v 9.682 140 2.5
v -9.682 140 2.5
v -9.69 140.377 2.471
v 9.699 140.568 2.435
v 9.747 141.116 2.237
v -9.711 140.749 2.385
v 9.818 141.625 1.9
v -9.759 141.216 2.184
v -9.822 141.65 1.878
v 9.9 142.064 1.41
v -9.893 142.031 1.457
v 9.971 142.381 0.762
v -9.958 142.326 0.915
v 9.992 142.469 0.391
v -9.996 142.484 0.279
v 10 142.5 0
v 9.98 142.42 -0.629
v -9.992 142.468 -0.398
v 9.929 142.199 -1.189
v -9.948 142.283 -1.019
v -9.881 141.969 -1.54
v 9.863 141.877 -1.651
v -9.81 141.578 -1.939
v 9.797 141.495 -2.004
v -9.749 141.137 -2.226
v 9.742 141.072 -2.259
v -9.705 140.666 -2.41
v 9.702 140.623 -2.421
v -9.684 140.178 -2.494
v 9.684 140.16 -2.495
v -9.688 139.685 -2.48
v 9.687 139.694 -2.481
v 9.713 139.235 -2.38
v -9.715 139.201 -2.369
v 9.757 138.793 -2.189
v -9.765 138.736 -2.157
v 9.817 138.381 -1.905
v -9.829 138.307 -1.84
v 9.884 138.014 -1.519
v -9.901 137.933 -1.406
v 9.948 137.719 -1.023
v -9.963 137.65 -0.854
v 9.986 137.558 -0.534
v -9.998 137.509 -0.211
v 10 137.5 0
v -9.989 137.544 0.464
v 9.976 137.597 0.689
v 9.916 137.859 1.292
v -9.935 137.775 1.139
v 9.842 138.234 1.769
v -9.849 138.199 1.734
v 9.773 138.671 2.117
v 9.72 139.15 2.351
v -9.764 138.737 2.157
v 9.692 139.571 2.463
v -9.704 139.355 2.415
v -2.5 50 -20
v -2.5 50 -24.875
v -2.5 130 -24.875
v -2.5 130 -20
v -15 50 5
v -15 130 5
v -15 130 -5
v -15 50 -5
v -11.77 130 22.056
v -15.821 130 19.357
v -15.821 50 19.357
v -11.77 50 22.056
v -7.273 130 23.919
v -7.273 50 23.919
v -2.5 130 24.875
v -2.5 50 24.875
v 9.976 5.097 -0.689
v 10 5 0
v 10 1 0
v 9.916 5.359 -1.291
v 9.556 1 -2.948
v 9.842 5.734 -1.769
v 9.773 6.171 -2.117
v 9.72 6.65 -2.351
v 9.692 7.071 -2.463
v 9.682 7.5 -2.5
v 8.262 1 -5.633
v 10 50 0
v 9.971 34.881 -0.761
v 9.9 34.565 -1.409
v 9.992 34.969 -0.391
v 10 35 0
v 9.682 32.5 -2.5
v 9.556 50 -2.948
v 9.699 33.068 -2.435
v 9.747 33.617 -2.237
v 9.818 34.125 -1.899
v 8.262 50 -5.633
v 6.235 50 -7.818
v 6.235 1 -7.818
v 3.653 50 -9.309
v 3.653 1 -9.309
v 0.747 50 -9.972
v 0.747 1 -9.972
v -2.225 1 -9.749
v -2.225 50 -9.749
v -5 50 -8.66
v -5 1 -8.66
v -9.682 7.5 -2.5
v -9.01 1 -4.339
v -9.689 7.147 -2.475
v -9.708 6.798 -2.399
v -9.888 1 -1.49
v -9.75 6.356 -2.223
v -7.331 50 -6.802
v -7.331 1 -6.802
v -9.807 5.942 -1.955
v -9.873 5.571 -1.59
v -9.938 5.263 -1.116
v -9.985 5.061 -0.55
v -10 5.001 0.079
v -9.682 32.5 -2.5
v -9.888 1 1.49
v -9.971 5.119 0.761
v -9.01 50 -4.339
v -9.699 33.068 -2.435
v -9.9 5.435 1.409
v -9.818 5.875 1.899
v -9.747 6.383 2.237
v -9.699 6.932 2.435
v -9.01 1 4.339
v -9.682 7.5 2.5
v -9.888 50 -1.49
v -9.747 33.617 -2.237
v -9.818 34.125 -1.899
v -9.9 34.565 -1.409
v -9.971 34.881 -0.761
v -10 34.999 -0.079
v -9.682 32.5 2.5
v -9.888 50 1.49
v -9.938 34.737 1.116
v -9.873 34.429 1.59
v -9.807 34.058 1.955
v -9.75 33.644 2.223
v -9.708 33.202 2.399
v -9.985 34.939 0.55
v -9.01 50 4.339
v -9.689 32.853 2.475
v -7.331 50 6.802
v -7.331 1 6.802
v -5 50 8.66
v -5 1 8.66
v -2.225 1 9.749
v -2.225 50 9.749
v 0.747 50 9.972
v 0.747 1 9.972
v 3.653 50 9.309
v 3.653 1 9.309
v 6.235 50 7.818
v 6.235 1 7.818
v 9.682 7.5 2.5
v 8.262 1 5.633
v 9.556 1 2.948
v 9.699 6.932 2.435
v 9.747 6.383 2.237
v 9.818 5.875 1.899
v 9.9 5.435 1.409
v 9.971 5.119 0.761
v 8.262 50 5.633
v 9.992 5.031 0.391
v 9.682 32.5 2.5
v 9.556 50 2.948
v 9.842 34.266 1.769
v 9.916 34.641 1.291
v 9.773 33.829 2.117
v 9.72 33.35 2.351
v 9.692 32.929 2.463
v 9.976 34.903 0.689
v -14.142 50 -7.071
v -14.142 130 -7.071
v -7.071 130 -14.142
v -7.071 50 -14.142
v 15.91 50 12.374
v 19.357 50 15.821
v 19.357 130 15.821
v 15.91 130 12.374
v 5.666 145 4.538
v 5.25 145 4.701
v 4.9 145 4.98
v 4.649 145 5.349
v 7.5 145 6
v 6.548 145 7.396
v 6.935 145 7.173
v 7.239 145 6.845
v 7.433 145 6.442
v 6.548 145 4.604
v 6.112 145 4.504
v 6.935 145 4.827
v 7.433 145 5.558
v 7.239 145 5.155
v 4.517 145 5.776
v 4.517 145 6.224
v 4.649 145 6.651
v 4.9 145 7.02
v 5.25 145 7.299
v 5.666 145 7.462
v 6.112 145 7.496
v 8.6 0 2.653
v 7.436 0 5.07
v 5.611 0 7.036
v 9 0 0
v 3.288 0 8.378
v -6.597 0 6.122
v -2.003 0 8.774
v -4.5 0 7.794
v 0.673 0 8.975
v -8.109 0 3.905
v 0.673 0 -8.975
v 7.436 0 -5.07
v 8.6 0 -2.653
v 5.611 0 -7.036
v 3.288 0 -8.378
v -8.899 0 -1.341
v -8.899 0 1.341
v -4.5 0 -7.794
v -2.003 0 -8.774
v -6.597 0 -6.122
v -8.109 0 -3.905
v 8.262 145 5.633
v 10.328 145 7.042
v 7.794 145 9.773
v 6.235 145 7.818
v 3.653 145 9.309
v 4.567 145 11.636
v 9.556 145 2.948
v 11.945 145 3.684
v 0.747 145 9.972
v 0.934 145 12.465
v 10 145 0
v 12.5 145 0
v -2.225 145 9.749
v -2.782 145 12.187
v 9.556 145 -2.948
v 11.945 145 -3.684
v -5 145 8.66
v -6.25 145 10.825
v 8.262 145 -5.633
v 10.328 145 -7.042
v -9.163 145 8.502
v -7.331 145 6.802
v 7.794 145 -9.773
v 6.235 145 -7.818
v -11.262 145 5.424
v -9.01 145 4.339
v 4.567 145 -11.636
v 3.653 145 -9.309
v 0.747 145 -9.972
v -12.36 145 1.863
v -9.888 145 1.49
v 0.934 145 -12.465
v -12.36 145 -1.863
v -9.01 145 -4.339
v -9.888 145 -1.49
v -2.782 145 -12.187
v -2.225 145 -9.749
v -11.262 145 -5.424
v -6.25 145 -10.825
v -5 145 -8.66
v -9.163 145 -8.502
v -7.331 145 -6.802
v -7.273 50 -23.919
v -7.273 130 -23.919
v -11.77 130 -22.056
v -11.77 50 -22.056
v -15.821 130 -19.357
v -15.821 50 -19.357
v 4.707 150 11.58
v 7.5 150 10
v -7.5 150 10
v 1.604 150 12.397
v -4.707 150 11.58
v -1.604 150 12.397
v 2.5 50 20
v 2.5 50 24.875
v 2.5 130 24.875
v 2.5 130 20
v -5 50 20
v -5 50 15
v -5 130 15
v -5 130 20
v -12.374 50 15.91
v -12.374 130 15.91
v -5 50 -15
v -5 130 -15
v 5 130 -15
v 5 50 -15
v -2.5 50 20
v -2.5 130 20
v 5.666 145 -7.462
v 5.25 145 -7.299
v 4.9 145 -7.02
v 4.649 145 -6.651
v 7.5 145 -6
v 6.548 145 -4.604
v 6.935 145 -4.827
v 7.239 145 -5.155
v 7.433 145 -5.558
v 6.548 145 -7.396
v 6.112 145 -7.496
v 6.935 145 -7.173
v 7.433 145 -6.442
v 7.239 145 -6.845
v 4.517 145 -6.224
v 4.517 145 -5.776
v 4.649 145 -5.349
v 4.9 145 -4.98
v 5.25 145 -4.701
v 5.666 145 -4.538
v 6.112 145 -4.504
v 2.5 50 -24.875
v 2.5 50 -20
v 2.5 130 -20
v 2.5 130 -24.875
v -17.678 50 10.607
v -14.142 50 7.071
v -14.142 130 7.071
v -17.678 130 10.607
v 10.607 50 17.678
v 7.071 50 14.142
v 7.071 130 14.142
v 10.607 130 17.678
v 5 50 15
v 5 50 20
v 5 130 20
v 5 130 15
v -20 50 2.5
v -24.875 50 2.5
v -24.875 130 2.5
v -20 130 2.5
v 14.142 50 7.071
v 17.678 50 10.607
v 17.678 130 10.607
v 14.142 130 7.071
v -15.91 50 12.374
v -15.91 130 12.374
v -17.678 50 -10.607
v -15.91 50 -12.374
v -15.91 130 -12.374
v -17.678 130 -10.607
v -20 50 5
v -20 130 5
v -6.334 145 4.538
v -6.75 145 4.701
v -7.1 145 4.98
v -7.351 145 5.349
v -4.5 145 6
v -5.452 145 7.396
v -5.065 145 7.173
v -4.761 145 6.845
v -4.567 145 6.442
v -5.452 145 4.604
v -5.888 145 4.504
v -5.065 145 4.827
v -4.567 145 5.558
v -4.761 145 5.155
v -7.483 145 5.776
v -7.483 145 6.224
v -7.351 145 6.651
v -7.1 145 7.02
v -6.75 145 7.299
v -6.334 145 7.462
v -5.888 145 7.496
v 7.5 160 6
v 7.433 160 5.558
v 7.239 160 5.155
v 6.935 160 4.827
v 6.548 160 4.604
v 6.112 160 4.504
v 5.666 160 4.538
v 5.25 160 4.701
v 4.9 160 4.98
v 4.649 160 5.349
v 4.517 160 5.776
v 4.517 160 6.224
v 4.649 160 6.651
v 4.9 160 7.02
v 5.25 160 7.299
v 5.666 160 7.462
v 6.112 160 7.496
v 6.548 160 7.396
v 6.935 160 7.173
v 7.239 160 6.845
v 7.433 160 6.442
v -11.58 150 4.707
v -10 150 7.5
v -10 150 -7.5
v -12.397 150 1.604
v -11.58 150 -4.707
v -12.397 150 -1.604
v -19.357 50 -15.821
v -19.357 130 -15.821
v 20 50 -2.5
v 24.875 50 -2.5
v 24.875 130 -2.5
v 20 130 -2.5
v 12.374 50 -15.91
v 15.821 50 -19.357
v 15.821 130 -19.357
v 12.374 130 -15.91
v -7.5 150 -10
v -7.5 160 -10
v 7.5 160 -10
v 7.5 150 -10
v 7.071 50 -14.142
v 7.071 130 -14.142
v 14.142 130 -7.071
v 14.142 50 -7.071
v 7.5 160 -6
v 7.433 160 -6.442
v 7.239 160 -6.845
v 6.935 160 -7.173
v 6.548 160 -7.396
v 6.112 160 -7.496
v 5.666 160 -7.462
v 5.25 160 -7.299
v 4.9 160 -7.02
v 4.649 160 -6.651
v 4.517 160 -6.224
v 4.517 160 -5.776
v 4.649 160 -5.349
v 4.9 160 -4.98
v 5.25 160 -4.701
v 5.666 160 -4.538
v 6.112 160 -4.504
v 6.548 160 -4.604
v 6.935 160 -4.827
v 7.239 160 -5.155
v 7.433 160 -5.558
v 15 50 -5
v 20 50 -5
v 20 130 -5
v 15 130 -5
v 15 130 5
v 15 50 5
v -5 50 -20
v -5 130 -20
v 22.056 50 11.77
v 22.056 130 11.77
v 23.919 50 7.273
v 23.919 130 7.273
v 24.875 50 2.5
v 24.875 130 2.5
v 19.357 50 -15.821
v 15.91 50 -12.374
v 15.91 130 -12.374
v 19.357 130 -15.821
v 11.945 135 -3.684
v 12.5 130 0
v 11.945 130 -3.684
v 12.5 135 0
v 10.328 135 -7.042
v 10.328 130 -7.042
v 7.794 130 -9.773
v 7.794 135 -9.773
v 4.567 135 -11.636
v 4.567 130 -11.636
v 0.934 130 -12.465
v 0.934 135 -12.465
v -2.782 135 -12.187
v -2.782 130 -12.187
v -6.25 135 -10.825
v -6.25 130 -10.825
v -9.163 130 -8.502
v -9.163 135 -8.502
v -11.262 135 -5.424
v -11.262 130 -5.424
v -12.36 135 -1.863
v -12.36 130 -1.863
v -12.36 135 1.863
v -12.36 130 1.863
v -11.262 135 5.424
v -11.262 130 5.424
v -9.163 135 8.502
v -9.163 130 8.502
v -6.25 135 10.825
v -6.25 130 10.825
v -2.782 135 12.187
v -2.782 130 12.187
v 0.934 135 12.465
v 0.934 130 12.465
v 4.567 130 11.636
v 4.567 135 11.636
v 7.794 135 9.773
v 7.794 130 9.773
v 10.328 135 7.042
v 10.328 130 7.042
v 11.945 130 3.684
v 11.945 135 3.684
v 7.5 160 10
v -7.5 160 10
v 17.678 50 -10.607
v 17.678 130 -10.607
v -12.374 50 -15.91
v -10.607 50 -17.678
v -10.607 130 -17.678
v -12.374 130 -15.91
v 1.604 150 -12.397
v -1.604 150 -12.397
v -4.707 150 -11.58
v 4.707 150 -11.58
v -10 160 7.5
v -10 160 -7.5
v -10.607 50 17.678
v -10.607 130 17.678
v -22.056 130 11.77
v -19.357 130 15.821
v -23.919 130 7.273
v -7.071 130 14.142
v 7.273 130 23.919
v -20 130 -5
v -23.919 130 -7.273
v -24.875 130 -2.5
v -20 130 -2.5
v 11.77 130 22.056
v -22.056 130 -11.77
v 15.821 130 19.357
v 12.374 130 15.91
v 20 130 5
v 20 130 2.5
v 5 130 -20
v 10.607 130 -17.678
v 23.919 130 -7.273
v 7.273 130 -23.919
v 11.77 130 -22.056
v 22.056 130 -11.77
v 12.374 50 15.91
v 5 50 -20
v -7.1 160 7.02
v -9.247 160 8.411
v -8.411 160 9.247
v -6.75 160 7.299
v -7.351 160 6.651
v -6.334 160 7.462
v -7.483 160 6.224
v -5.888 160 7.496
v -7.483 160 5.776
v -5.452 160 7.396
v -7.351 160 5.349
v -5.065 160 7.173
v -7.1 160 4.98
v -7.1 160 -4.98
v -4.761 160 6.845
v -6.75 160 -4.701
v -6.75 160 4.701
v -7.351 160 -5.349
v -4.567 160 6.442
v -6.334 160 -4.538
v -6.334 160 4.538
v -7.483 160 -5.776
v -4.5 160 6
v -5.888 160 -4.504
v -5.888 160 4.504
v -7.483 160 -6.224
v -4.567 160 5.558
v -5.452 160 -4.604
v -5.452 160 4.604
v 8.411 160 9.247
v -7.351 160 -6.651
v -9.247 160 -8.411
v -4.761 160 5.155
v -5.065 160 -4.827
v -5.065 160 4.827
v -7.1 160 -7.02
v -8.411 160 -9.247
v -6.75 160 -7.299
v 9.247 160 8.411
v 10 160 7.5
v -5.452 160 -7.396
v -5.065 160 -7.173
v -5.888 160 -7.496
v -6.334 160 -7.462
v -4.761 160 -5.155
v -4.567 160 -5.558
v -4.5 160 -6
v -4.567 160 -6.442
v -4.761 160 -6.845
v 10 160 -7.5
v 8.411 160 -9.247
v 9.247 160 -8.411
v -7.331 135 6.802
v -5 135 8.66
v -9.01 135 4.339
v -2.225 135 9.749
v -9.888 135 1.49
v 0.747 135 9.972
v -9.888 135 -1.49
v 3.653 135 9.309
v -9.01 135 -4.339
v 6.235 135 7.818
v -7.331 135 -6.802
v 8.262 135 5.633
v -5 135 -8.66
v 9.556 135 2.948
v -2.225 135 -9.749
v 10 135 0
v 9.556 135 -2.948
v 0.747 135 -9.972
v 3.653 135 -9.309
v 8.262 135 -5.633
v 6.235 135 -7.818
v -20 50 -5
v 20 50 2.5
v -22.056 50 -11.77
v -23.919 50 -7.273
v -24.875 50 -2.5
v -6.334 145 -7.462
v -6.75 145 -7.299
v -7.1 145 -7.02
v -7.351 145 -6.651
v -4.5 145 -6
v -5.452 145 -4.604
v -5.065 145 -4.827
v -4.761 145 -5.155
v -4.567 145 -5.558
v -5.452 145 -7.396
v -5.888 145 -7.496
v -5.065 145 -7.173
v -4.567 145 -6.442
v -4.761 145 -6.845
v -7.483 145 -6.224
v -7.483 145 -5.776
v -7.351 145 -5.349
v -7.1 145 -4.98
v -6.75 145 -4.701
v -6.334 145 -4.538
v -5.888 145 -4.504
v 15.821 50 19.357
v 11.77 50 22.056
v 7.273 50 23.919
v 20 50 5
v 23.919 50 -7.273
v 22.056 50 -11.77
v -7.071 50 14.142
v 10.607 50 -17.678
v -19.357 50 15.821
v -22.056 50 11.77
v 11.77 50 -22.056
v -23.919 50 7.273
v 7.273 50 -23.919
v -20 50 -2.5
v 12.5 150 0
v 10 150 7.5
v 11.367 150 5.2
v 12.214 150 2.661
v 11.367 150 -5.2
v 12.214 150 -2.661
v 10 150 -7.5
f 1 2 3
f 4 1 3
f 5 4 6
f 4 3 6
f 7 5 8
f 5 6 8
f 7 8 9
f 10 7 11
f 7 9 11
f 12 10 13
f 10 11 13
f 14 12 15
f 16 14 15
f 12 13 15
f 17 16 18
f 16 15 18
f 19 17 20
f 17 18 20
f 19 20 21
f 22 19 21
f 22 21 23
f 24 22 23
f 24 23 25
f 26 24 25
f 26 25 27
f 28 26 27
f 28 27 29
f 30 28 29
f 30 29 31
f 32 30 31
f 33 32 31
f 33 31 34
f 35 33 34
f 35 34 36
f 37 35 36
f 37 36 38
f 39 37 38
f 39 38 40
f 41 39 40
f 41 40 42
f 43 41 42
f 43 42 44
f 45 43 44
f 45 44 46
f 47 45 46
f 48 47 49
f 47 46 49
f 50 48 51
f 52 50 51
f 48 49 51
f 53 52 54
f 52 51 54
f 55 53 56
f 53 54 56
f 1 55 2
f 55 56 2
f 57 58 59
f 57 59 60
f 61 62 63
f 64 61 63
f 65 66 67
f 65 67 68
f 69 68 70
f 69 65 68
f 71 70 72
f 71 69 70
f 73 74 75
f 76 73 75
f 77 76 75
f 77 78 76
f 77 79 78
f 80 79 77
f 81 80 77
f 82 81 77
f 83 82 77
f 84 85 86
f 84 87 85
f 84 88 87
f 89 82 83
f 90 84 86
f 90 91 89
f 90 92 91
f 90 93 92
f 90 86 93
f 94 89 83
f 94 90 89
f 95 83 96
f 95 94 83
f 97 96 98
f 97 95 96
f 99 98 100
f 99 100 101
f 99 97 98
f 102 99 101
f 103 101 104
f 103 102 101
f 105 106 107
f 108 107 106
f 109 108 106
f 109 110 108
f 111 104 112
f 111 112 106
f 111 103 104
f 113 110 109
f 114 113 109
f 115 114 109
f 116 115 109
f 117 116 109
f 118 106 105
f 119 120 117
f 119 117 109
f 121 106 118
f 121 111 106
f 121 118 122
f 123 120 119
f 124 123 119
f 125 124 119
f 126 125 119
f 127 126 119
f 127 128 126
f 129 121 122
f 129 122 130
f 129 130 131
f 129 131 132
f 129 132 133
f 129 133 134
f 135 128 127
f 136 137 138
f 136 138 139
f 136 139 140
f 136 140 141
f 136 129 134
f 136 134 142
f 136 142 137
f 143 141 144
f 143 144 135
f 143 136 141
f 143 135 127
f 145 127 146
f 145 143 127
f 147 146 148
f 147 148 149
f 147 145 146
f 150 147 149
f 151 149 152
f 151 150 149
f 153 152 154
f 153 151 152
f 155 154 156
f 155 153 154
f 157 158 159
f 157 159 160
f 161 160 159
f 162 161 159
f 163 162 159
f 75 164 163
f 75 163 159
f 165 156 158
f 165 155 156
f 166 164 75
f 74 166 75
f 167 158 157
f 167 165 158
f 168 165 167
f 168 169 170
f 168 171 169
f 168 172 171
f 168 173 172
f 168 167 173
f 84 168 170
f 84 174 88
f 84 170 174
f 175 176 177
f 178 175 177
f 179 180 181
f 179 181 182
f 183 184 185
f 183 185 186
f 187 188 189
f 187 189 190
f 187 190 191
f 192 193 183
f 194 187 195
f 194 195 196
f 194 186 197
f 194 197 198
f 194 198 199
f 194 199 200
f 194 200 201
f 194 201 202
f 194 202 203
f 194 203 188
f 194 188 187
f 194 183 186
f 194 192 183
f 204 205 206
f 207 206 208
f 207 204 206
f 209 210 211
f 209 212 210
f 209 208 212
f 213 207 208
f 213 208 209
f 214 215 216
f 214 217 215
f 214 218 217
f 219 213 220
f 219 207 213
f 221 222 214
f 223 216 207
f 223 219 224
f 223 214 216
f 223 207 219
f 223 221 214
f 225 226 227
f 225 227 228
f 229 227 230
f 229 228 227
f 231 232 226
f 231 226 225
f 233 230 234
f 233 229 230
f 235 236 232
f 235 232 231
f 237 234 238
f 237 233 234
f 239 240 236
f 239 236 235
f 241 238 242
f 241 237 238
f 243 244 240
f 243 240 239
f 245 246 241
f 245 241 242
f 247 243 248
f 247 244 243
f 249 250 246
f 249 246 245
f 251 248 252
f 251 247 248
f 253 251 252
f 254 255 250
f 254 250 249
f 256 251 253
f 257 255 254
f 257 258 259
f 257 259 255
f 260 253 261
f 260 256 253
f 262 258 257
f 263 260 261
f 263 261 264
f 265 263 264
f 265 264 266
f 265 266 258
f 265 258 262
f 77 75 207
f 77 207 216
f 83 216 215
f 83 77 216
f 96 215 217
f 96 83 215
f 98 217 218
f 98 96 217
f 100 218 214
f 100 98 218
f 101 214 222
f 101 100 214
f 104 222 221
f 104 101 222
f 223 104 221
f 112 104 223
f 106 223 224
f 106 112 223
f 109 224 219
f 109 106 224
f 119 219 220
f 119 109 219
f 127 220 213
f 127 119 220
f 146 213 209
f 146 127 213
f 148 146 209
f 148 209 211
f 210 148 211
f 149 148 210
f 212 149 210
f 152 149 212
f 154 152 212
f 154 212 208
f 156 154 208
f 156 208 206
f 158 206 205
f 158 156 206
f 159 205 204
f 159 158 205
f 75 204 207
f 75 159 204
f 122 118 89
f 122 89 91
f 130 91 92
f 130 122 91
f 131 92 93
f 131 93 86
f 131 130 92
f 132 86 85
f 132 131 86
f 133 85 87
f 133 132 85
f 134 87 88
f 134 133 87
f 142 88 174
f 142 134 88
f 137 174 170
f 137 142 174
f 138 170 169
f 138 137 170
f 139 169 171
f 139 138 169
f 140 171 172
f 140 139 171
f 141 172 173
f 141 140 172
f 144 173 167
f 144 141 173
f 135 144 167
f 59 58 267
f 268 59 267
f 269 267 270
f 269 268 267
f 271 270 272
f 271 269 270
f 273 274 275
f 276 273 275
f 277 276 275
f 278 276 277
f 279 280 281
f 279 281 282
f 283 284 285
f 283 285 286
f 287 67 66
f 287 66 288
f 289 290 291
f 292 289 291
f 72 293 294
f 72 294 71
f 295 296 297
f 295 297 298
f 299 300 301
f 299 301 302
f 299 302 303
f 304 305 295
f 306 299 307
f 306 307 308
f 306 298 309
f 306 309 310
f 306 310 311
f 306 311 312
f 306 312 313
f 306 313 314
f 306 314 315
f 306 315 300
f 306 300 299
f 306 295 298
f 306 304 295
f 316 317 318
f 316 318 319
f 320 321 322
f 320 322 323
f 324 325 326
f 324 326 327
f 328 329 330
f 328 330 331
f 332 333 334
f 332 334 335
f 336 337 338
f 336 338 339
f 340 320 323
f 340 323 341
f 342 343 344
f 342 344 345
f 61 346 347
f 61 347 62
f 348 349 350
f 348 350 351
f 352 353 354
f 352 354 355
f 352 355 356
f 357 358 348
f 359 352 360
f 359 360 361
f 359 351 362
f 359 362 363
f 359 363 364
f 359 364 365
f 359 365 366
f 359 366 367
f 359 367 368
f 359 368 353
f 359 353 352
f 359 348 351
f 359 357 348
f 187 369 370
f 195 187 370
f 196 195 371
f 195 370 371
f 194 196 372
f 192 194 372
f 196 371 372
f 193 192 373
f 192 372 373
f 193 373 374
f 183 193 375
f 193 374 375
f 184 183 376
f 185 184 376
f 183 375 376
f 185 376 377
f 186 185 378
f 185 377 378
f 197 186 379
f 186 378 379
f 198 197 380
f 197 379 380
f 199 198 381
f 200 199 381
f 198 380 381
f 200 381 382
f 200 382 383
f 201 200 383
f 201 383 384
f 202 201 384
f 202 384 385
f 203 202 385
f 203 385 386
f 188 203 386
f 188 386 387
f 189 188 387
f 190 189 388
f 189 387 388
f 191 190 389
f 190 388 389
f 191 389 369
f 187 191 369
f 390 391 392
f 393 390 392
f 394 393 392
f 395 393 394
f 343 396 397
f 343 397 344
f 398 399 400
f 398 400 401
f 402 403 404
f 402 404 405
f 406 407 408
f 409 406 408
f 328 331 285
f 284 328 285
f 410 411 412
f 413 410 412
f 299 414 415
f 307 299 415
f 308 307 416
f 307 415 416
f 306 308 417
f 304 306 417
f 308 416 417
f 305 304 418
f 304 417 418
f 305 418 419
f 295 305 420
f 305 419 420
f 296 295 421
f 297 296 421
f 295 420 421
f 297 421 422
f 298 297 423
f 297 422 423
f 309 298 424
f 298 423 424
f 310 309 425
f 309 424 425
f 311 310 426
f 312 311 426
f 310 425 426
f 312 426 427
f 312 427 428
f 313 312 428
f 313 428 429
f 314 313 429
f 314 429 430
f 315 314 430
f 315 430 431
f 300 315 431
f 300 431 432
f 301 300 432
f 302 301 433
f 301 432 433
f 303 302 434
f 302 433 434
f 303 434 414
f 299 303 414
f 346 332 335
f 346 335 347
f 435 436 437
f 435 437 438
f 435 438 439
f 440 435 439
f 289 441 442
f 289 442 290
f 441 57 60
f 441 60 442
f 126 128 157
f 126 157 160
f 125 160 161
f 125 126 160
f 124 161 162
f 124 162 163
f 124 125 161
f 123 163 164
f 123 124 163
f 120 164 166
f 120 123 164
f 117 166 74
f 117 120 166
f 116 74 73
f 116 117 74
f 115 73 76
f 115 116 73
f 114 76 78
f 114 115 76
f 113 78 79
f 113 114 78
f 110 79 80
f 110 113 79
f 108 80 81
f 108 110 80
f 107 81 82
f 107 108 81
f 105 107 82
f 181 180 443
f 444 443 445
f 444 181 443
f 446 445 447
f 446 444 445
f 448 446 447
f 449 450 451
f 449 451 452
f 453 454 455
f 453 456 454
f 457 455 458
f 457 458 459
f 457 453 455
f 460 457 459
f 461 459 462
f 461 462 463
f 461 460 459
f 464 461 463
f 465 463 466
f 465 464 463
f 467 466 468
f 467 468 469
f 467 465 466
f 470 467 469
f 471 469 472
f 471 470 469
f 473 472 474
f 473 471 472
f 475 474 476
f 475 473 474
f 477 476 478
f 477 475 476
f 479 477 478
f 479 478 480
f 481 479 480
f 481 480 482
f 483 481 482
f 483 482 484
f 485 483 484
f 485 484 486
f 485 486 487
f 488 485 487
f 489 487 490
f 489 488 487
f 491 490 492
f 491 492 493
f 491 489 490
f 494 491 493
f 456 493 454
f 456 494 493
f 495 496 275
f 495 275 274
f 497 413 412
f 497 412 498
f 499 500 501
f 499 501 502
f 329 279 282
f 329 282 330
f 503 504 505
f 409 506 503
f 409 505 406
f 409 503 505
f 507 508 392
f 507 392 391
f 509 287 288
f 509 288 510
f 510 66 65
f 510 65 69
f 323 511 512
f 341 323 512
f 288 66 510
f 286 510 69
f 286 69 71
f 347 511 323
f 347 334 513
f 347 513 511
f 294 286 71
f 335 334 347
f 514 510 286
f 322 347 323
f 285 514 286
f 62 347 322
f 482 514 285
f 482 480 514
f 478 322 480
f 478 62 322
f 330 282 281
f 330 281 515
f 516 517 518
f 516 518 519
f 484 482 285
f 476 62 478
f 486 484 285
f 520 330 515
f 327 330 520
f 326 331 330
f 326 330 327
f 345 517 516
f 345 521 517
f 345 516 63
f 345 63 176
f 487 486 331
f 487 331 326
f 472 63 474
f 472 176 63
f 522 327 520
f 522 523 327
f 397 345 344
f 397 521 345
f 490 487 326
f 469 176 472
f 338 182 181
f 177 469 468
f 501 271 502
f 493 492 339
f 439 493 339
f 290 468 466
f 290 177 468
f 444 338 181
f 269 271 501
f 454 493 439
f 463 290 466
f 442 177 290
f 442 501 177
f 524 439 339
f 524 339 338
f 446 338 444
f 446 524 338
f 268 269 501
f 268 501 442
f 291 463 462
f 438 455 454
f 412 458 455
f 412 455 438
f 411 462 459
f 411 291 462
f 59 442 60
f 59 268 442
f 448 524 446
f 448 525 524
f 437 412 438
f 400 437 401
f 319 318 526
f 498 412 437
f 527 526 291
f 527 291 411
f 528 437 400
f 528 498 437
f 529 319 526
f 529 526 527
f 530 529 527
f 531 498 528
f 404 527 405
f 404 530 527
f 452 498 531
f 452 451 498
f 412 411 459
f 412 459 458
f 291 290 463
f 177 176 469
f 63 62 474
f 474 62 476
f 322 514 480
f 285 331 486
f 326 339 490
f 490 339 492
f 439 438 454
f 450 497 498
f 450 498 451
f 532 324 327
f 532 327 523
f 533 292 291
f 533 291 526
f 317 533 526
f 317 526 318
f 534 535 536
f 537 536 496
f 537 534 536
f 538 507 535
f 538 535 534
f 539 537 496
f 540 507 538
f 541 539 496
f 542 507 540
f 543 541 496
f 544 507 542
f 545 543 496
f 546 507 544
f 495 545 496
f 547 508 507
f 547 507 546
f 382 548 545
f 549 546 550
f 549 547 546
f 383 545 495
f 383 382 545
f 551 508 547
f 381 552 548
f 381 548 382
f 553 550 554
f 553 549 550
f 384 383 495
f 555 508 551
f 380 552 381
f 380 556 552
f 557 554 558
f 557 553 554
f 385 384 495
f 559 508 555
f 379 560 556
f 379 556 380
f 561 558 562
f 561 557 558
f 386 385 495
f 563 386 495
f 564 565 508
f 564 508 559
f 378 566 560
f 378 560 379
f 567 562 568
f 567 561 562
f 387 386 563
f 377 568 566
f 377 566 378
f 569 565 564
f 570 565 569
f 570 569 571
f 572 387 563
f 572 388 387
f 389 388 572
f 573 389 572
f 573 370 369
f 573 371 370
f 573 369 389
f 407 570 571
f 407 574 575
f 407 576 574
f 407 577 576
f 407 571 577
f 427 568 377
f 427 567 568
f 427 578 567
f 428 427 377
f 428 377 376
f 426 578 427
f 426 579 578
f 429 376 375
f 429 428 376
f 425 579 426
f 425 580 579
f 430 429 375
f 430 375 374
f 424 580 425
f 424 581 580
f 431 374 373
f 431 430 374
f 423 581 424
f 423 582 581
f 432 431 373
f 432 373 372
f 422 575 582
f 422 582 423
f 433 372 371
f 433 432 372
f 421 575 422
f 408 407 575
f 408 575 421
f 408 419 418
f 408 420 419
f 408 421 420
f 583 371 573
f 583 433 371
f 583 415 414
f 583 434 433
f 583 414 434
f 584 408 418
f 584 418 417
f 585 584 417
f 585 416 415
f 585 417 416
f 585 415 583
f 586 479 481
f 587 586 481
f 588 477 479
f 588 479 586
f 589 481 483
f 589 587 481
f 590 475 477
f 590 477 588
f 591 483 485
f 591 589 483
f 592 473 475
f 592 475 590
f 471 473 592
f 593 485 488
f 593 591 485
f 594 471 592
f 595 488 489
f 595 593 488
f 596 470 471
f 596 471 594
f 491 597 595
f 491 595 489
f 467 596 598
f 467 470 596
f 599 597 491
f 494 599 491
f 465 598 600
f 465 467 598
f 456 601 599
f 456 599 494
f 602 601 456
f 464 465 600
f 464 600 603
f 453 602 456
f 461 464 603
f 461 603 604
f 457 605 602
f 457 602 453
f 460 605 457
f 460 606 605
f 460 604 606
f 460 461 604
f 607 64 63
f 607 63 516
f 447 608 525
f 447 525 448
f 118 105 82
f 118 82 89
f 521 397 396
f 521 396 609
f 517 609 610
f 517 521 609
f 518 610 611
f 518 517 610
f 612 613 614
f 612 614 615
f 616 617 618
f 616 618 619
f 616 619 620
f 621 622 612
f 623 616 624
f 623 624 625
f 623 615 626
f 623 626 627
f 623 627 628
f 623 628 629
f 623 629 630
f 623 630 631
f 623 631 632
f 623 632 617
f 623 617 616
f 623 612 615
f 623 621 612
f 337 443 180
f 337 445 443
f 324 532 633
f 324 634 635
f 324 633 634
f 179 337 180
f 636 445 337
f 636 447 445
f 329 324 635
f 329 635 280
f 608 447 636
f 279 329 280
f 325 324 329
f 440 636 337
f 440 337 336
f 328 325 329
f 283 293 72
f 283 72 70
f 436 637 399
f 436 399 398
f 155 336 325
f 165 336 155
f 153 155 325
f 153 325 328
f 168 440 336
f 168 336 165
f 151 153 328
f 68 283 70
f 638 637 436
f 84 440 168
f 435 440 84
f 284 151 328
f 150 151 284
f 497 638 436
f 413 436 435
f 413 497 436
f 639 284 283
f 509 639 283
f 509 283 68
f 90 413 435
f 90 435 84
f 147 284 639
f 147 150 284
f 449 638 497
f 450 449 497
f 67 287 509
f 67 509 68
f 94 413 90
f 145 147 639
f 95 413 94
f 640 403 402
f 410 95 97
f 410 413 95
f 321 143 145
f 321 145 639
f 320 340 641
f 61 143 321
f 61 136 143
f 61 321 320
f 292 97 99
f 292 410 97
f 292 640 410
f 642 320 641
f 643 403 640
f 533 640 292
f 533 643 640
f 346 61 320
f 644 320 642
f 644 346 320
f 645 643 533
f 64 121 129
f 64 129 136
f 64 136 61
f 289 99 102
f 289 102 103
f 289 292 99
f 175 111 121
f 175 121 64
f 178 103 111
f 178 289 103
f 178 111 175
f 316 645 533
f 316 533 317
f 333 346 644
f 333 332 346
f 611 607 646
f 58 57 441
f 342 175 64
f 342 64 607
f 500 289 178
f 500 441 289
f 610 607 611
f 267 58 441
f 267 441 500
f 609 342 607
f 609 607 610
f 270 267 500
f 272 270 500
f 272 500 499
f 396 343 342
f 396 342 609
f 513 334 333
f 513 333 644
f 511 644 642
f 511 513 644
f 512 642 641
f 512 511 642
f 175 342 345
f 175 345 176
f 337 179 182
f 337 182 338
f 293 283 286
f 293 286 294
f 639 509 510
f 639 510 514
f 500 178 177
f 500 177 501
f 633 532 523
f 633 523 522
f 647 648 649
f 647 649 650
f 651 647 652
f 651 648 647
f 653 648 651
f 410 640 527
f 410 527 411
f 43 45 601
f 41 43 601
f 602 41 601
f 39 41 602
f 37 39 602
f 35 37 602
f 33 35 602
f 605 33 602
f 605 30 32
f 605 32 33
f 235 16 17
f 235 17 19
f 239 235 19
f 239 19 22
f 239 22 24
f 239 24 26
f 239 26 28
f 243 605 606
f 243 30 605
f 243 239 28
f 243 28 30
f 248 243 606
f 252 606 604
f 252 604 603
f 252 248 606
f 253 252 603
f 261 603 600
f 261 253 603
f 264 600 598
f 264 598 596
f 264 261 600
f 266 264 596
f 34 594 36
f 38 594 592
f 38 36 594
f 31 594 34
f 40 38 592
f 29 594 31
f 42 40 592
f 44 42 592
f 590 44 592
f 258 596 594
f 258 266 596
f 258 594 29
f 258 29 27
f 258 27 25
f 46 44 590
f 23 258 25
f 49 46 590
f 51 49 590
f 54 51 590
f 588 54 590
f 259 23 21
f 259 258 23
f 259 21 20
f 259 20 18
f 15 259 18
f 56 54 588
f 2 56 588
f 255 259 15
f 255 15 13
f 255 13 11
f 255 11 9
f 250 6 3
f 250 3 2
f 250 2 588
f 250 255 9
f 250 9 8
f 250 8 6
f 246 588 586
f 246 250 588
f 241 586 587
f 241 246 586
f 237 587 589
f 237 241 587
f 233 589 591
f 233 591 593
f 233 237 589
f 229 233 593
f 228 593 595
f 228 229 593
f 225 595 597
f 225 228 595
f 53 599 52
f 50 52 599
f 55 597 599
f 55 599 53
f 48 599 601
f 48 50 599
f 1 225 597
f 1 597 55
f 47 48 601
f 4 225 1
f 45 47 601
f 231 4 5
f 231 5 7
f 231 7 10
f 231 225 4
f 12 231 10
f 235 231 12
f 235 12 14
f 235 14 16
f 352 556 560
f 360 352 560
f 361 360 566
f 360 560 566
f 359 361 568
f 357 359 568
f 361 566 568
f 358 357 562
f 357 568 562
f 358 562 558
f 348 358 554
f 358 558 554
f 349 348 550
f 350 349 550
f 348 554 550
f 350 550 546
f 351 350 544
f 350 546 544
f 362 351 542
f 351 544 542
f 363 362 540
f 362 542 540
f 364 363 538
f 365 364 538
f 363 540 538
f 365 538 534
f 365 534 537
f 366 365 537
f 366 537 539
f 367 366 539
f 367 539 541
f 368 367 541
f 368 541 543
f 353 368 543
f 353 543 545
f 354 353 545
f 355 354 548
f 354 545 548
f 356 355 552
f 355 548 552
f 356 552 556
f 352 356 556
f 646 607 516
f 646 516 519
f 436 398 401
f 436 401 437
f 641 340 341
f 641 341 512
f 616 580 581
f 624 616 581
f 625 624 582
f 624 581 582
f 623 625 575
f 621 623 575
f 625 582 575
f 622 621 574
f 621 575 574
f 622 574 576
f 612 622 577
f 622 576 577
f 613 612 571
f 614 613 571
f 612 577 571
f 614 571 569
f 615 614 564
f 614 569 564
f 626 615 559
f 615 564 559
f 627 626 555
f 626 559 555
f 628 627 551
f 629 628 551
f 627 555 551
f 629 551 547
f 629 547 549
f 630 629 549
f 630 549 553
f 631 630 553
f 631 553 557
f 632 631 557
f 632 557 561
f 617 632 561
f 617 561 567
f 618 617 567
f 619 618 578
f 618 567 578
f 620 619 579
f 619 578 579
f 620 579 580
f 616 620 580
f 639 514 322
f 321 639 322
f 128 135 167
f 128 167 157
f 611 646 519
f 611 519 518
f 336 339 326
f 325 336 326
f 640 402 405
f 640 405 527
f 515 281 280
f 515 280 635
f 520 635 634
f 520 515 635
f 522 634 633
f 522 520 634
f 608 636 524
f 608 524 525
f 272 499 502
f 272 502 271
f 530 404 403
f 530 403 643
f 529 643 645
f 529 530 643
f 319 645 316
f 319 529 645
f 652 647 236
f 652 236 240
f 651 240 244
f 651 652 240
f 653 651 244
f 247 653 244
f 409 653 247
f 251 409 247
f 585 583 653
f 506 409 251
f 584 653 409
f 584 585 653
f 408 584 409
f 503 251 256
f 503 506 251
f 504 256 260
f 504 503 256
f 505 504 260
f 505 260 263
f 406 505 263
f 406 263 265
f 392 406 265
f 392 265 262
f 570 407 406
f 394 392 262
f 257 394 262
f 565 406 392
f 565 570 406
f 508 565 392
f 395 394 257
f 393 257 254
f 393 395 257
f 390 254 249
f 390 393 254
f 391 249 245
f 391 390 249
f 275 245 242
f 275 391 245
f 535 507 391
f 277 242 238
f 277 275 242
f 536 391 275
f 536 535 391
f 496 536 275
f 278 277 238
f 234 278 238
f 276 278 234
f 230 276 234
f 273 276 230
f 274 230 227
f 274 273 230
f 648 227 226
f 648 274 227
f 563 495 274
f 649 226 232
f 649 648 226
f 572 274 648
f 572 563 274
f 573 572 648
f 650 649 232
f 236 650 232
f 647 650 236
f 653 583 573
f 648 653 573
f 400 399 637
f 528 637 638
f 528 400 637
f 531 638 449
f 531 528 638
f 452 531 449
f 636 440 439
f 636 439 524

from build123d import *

# Parameters (mm, degrees)
CHAMFER1_SIZE       = 1
CUT_EXTRUDE6_DEPTH  = 130
CIRPATTERN1_COUNT   = 8
CUT_EXTRUDE8_DEPTH  = 10
SKETCH4_R           = 1.5
CUT_EXTRUDE9_DEPTH  = 15
SKETCH5_R           = 2.5
CUT_EXTRUDE10_DEPTH = 20
CUT_EXTRUDE11_DEPTH = 20


with BuildPart() as part:
    # Sketch1 → Revolve8 (revolve)
    with BuildSketch(Plane.XY):
        Polygon((0, 0), (10, 0), (10, 50), (25, 50), (25, 130), (12.5, 130), (12.5, 135), (10, 135), (10, 145), (12.5, 145), (12.5, 160), (0, 160), align=None)
    revolve(axis=Axis((0, 0, 0), (0, 1, 0)))

    # Chamfer1
    chamfer1_edges = [part.edges().sort_by_distance(p)[0] for p in [
        (-10, 0, 0),
    ]]
    chamfer(chamfer1_edges, length=CHAMFER1_SIZE)

    # Sketch2 → Cut-Extrude6 (cut)
    with BuildSketch(Plane(origin=(0, 0, 0), x_dir=(1, 0, 0), z_dir=(0, 1, 0))):
        with BuildLine():
            Line((24.874685928, 2.5), (20, 2.5))
            Line((20, 2.5), (20, 5))
            Line((20, 5), (15, 5))
            Line((15, 5), (15, -5))
            Line((15, -5), (20, -5))
            Line((20, -5), (20, -2.5))
            Line((20, -2.5), (24.874685928, -2.5))
            ThreePointArc((24.874685928, -2.5), (25, 0), (24.874685928, 2.5))
        make_face()
    cut_extrude6 = extrude(amount=CUT_EXTRUDE6_DEPTH, mode=Mode.SUBTRACT)

    # CirPattern1: Cut-Extrude6 ×8 about axis
    cirpattern1_axis = Axis((0, 0, 0), (0, 1, 0))
    for i in range(1, CIRPATTERN1_COUNT):
        add(cut_extrude6.rotate(cirpattern1_axis, i * 360 / CIRPATTERN1_COUNT), mode=Mode.SUBTRACT)

    # Sketch3 → Cut-Extrude8 (cut)
    with BuildSketch(Plane(origin=(0, 160, 0), x_dir=(1, 0, 0), z_dir=(0, 1, 0))):
        with BuildLine():
            Line((-7.5, 10), (7.5, 10))
            ThreePointArc((7.5, 10), (0, 12.5), (-7.5, 10))
        make_face()
        with BuildLine():
            Line((-10, 7.5), (-10, -7.5))
            ThreePointArc((-10, -7.5), (-12.5, 0), (-10, 7.5))
        make_face()
        with BuildLine():
            Line((-7.5, -10), (7.5, -10))
            ThreePointArc((7.5, -10), (0, -12.5), (-7.5, -10))
        make_face()
        with BuildLine():
            Line((10, 7.5), (10, -7.5))
            ThreePointArc((10, -7.5), (12.5, 0), (10, 7.5))
        make_face()
    extrude(amount=-CUT_EXTRUDE8_DEPTH, mode=Mode.SUBTRACT)

    # Sketch4 → Cut-Extrude9 (cut)
    with BuildSketch(Plane(origin=(0, 160, 0), x_dir=(1, 0, 0), z_dir=(0, 1, 0))):
        with Locations((-6, 6)):
            Circle(SKETCH4_R)
        with Locations((6, 6)):
            Circle(SKETCH4_R)
        with Locations((6, -6)):
            Circle(SKETCH4_R)
        with Locations((-6, -6)):
            Circle(SKETCH4_R)
    extrude(amount=-CUT_EXTRUDE9_DEPTH, mode=Mode.SUBTRACT)

    # Sketch5 → Cut-Extrude10 (cut)
    with BuildSketch(Plane.ZY.offset(10)):
        with Locations((0, 140)):
            Circle(SKETCH5_R)
    extrude(amount=-CUT_EXTRUDE10_DEPTH, mode=Mode.SUBTRACT)

    # Sketch6 → Cut-Extrude11 (cut)
    with BuildSketch(Plane.ZY.offset(10)):
        with BuildLine():
            Line((2.5, 32.5), (2.5, 7.5))
            ThreePointArc((2.5, 7.5), (0, 5), (-2.5, 7.5))
            Line((-2.5, 7.5), (-2.5, 32.5))
            ThreePointArc((-2.5, 32.5), (0, 35), (2.5, 32.5))
        make_face()
    extrude(amount=-CUT_EXTRUDE11_DEPTH, mode=Mode.SUBTRACT)


solid = part.part
